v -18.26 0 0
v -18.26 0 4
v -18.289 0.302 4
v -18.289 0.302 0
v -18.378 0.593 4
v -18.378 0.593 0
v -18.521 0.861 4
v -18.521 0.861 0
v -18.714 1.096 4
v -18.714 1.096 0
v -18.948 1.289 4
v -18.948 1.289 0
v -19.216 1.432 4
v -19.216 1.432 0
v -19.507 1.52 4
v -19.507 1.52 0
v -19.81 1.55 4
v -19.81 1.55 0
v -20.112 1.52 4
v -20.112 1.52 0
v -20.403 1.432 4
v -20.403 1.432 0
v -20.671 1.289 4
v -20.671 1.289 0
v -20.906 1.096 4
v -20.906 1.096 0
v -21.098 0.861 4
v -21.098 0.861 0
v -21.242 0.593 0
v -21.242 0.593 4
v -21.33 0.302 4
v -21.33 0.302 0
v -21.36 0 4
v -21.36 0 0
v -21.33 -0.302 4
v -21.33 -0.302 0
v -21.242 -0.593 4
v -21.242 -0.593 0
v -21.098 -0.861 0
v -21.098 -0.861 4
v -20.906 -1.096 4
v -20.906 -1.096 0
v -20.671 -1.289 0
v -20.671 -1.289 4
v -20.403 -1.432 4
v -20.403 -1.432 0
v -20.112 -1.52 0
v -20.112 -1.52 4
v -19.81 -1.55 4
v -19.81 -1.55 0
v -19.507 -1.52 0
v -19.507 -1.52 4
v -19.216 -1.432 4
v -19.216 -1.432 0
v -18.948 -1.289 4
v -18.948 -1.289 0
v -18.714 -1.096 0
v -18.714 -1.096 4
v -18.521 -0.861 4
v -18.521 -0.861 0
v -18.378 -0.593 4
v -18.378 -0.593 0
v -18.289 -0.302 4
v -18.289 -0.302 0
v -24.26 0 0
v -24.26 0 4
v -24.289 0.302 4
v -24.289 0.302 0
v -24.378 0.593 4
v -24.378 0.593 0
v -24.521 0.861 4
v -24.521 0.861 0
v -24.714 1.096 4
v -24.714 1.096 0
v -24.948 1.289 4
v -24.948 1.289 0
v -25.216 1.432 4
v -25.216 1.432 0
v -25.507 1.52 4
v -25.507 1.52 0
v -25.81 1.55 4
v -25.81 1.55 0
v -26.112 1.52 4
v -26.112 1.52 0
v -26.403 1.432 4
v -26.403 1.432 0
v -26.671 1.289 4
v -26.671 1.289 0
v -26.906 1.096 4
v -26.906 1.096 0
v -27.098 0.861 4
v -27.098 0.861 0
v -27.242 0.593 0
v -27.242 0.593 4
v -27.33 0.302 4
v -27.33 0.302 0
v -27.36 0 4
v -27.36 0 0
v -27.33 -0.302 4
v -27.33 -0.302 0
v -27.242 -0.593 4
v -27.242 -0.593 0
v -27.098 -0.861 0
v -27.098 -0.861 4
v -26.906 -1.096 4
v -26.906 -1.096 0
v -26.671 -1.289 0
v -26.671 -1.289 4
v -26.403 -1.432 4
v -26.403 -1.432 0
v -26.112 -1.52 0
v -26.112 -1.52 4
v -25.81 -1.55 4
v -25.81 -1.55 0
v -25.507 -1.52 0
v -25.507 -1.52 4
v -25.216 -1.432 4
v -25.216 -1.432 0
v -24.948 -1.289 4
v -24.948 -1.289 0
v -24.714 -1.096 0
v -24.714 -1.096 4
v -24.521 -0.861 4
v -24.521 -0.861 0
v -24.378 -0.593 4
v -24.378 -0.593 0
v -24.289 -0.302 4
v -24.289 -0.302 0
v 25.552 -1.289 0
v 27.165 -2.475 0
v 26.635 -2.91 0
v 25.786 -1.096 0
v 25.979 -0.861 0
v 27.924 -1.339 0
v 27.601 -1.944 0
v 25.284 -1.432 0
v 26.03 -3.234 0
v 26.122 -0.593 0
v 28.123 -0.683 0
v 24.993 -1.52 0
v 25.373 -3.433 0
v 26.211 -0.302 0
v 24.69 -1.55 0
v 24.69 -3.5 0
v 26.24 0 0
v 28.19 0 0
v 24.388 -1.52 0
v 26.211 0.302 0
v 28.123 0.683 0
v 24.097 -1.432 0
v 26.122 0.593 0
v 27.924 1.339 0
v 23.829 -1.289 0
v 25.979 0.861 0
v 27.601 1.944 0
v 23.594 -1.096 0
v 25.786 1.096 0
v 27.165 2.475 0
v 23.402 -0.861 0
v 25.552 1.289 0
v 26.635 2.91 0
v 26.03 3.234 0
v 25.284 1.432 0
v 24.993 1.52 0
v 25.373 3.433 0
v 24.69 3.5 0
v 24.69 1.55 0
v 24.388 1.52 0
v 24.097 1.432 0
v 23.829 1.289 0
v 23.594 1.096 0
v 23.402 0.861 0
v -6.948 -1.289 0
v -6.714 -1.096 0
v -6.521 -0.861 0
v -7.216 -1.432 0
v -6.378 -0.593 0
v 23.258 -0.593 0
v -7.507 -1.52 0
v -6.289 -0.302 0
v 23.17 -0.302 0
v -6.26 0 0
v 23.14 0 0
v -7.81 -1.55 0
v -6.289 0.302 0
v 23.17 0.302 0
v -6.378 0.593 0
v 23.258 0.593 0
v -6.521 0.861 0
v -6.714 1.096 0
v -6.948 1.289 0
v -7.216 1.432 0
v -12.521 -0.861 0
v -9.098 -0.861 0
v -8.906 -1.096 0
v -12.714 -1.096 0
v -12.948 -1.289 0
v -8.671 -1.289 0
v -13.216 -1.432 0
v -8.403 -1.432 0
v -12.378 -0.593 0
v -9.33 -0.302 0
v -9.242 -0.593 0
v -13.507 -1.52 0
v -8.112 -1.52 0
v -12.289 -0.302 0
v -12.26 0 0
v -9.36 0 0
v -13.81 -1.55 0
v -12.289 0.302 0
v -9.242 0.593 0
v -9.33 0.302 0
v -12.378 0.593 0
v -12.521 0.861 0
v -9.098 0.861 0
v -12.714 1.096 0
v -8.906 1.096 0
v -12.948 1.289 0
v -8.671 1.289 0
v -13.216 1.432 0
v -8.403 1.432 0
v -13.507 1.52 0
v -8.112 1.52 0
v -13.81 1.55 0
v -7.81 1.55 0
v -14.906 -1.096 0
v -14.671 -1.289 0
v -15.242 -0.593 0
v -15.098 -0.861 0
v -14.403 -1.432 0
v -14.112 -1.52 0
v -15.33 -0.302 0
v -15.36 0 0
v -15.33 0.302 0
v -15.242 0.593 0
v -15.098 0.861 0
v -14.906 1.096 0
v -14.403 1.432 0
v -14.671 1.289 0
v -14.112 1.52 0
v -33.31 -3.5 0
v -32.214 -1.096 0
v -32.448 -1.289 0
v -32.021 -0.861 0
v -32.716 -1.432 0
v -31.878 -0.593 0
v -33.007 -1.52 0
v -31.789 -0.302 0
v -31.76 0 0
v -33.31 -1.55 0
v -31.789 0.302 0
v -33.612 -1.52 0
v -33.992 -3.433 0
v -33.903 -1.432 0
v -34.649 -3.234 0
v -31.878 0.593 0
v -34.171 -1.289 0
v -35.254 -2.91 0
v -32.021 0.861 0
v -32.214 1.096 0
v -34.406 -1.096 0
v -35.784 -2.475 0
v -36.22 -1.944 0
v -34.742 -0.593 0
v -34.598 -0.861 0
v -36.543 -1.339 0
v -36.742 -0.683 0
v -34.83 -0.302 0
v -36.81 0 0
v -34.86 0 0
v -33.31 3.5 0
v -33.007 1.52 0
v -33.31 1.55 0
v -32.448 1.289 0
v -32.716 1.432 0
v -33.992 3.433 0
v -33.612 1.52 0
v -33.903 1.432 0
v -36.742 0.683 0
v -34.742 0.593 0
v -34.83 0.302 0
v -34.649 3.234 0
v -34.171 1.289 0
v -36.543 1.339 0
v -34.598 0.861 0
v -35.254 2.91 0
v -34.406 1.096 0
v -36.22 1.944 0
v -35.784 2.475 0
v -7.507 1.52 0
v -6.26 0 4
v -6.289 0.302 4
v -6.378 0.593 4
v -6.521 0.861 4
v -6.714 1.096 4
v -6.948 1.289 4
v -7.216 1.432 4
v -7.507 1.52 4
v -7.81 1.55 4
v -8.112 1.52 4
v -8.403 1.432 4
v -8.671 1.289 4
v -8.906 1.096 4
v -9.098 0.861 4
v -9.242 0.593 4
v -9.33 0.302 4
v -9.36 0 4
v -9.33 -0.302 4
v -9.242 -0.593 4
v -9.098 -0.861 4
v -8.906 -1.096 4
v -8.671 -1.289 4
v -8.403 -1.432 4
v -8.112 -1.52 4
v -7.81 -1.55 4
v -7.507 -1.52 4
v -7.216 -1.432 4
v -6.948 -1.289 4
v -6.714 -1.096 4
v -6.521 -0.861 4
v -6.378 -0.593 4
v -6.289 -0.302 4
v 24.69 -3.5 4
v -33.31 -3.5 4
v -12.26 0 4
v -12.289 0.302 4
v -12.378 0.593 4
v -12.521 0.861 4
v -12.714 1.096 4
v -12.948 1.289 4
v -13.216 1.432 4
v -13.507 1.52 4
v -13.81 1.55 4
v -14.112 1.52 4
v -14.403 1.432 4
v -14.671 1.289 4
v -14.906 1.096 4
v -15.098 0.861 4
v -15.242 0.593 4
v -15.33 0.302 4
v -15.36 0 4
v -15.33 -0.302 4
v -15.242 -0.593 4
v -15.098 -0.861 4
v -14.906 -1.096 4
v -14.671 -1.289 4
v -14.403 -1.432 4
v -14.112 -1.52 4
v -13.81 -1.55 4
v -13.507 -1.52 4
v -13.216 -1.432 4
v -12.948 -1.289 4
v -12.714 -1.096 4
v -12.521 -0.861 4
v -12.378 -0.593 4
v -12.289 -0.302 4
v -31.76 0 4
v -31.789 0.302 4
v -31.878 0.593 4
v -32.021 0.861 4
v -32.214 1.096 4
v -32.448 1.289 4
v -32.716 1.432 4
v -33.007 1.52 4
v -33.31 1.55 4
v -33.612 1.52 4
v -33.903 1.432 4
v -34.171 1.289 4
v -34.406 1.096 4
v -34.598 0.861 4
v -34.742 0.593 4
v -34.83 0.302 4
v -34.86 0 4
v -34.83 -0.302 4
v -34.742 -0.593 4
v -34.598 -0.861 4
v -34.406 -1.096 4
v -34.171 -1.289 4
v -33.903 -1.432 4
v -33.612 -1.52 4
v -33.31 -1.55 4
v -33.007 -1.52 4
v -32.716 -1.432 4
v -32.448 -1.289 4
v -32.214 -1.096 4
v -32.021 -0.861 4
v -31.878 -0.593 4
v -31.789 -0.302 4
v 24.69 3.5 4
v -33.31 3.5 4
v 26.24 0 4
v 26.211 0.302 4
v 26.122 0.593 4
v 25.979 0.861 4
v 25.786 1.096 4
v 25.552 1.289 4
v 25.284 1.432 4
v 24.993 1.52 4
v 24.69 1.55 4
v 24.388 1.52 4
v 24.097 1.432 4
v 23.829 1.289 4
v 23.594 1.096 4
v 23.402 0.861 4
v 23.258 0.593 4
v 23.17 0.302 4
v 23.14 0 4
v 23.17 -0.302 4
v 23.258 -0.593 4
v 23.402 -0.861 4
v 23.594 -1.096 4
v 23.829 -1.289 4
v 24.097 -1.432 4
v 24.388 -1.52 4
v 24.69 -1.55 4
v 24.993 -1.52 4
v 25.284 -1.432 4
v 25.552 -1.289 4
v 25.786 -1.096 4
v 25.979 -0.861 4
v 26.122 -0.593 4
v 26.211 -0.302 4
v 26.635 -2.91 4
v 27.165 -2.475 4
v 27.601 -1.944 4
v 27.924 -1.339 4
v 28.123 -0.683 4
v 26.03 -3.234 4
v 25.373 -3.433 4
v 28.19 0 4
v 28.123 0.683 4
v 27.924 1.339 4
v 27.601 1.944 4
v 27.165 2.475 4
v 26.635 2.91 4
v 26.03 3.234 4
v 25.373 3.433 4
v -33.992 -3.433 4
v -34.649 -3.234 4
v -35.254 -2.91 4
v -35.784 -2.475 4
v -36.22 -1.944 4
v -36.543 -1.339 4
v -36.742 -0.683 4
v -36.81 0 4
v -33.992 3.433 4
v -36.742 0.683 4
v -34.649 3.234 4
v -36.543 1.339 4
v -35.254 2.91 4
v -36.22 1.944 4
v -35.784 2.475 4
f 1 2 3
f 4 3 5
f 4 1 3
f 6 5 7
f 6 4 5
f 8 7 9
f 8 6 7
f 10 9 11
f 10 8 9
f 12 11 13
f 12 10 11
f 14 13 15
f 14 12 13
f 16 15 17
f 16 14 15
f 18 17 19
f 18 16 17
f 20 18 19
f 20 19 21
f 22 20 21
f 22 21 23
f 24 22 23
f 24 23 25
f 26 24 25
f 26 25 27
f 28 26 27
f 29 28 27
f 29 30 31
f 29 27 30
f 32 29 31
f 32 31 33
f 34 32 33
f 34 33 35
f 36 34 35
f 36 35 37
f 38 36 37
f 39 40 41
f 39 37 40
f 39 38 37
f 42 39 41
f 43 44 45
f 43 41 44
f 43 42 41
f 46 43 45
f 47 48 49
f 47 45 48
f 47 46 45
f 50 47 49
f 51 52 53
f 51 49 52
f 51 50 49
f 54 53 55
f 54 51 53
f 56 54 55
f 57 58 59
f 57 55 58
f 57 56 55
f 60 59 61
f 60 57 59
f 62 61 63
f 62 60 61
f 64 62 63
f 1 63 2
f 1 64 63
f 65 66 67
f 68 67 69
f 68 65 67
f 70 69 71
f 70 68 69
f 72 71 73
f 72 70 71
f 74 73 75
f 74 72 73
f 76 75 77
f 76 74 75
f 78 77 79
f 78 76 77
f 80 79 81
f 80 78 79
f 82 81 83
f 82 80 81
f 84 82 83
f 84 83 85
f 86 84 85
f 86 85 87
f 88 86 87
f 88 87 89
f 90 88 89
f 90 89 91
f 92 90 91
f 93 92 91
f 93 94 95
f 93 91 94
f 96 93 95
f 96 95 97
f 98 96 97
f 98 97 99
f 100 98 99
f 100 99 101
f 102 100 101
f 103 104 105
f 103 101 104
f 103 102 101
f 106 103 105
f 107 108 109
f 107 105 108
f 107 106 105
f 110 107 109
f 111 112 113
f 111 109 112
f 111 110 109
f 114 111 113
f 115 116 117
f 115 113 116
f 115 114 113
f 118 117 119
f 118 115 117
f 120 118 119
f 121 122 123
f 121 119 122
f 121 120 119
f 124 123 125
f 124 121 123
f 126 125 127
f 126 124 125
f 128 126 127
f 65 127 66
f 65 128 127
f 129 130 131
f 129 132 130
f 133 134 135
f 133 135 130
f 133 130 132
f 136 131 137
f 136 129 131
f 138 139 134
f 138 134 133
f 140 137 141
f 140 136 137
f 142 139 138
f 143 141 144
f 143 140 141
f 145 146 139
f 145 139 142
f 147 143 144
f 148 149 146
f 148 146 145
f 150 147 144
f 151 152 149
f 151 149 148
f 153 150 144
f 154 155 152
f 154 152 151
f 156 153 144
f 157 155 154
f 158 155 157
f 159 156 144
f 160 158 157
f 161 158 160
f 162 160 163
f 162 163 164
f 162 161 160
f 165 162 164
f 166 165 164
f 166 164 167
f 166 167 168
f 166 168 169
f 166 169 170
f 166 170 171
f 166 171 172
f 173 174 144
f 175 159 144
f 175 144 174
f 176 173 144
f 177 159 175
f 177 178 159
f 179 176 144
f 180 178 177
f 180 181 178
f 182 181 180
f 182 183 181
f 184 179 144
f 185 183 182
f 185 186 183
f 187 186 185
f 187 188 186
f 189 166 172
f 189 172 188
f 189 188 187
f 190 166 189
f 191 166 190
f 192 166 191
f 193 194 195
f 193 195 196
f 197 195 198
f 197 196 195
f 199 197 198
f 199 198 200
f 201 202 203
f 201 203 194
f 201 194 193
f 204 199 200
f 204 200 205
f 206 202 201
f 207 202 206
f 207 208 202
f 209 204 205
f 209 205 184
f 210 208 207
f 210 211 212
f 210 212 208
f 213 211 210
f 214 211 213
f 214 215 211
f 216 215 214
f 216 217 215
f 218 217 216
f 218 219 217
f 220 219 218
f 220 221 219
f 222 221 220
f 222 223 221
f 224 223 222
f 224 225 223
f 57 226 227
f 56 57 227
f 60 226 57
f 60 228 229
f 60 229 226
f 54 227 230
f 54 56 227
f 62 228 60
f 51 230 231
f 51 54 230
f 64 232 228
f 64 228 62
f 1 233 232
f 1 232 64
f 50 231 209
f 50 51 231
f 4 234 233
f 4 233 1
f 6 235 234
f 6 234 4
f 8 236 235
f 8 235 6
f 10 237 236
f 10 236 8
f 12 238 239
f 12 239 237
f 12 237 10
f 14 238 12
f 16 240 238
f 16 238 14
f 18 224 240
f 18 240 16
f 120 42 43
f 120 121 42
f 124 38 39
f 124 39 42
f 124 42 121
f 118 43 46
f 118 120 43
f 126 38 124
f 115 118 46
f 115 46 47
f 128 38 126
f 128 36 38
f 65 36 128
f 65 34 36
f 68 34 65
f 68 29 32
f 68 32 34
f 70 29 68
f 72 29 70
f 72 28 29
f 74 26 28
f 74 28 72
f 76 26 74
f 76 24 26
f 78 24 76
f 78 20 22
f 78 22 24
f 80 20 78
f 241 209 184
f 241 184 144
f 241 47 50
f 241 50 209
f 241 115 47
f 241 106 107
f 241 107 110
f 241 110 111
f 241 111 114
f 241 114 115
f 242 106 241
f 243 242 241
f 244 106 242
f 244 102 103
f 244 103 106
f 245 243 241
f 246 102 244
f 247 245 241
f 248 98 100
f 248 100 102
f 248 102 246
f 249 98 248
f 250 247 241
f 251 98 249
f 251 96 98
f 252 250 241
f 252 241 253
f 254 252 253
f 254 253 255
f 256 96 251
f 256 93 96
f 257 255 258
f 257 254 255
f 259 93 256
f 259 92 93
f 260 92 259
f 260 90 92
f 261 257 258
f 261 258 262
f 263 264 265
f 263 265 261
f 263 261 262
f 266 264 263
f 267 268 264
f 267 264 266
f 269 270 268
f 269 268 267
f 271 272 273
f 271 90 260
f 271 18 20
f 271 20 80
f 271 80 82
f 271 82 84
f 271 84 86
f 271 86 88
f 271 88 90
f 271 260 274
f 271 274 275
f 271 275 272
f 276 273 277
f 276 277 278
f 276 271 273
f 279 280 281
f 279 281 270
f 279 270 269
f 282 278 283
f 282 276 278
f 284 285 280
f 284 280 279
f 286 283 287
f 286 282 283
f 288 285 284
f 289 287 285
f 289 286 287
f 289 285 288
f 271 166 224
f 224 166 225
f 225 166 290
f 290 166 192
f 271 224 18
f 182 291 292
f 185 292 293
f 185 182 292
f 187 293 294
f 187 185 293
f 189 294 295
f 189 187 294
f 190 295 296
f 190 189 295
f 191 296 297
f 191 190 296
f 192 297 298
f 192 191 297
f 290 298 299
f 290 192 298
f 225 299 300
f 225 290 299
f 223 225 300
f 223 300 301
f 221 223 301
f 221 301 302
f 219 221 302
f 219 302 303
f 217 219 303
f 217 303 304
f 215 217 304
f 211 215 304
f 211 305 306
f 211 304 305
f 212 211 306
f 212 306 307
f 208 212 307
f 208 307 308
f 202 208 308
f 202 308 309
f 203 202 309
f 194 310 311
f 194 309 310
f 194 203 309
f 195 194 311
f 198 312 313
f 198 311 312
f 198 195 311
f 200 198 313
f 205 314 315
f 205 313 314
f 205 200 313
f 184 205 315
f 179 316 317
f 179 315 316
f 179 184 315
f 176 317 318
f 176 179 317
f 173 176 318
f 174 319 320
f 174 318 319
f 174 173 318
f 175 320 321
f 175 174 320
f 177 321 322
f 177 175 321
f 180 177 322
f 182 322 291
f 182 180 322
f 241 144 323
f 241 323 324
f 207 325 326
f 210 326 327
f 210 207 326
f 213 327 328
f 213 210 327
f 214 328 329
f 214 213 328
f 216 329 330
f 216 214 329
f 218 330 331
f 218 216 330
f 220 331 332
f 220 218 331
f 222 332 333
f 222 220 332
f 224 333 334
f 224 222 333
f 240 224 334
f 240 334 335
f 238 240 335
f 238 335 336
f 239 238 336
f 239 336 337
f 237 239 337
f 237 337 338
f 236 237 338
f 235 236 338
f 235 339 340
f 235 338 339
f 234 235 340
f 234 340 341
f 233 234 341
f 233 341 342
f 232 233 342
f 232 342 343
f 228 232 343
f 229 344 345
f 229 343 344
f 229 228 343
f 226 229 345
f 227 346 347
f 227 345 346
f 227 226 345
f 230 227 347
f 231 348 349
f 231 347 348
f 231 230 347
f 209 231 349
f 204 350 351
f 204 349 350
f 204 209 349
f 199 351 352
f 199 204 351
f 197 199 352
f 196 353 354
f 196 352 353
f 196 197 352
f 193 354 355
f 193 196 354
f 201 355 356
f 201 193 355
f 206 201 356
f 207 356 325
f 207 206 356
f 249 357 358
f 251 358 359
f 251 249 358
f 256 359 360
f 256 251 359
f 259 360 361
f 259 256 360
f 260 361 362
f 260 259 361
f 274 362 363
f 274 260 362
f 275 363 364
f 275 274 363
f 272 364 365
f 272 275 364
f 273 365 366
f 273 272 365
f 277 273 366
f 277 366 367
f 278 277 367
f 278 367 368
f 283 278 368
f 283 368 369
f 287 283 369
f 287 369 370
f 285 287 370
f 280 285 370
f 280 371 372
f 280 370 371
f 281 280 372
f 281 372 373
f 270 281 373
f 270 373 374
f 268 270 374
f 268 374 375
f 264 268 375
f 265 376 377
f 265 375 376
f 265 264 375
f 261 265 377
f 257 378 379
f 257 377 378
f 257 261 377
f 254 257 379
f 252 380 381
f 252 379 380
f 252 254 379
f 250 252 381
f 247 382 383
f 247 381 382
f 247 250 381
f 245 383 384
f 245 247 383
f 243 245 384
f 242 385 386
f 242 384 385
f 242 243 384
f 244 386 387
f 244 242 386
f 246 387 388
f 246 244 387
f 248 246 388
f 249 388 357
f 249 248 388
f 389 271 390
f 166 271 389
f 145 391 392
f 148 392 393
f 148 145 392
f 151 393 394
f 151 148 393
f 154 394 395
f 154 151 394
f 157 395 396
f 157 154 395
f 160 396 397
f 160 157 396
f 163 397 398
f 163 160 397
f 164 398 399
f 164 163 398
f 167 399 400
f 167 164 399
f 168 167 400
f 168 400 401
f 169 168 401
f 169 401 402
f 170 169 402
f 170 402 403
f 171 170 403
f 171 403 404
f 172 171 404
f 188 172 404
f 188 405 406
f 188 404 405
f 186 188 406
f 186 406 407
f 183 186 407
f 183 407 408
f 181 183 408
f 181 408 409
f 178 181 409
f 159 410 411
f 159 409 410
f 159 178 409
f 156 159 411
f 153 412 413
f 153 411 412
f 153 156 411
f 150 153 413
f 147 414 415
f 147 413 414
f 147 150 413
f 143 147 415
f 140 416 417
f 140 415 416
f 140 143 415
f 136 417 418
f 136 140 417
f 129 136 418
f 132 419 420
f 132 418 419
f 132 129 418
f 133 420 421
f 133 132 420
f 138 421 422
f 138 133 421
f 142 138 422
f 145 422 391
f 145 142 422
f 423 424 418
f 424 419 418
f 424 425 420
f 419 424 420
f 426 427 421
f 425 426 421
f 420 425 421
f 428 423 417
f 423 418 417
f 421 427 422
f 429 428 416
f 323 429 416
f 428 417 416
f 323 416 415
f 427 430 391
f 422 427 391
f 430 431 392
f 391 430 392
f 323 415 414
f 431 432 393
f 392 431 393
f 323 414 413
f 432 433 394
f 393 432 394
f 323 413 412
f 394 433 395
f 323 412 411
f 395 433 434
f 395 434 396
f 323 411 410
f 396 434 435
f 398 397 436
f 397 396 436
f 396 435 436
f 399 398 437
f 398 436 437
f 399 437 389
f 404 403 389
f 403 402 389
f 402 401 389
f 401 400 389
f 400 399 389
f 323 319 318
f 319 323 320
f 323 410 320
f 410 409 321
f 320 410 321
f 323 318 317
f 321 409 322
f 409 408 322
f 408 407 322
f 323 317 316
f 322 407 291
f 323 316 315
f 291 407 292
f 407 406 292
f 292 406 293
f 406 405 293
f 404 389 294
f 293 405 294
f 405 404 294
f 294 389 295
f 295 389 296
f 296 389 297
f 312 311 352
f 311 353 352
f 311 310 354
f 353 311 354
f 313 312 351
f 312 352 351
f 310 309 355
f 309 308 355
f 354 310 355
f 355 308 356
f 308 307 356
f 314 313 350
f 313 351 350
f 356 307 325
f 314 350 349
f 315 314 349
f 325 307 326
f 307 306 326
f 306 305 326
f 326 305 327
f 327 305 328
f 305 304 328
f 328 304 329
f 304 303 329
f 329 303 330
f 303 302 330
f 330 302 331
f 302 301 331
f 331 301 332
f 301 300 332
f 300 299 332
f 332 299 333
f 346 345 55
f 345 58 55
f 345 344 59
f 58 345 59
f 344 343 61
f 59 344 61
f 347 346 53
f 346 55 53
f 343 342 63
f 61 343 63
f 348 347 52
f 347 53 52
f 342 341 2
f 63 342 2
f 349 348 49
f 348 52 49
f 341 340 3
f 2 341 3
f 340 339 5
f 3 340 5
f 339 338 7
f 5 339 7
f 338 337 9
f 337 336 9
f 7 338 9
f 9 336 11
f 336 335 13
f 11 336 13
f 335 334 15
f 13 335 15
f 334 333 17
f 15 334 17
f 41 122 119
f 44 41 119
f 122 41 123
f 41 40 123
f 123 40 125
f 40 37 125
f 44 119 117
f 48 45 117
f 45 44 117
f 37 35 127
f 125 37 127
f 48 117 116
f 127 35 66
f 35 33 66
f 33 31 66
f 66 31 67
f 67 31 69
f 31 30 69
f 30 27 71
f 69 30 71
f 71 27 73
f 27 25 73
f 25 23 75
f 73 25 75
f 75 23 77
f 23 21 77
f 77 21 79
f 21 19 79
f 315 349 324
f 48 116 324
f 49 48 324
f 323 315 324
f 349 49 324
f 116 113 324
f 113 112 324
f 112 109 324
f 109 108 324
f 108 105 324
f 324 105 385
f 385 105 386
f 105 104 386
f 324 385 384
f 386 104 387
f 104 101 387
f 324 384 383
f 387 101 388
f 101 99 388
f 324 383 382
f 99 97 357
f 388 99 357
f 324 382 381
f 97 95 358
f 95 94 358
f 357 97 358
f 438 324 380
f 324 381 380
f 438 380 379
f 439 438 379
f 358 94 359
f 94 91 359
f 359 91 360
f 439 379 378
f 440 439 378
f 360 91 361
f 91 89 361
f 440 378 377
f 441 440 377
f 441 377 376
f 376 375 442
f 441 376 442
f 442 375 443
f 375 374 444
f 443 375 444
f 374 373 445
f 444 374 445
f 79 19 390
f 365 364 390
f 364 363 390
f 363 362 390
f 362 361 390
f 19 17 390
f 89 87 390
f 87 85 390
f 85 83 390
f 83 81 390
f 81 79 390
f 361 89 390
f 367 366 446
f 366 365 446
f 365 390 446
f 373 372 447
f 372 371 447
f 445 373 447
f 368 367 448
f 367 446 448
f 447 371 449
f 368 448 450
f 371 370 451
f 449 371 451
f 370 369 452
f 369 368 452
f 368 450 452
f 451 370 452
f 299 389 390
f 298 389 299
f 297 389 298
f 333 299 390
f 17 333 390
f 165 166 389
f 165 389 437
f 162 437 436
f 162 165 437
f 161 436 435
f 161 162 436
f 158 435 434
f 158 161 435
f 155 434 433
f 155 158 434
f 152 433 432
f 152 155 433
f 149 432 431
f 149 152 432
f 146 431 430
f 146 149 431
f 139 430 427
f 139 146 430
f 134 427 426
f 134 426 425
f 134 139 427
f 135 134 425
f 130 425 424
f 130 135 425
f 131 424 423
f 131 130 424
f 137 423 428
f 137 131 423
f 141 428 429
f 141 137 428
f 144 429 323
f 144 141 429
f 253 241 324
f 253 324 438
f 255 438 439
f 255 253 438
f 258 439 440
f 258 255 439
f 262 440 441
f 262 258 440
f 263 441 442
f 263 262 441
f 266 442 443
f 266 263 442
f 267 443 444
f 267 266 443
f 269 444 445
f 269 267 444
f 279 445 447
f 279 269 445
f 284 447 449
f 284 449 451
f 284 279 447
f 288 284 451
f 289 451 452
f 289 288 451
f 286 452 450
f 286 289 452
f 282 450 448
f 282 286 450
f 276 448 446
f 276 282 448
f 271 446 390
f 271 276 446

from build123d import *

# Parameters (mm, degrees)
BOSS_EXTRUDE1_DEPTH = 4
SKETCH2_R           = 1.55
CUT_EXTRUDE6_DEPTH  = 38.1913603


with BuildPart() as part:
    # Sketch1 → Boss-Extrude1 (new body)
    with BuildSketch(Plane.XY):
        with BuildLine():
            Line((-33.309608541, 3.5), (24.690391459, 3.5))
            ThreePointArc((24.690391459, 3.5), (28.190391459, 0), (24.690391459, -3.5))
            Line((24.690391459, -3.5), (-33.309608541, -3.5))
            ThreePointArc((-33.309608541, -3.5), (-36.809608541, 0), (-33.309608541, 3.5))
        make_face()
    extrude(amount=BOSS_EXTRUDE1_DEPTH)

    # Sketch2 → Cut-Extrude6 (cut, through all)
    with BuildSketch(Plane.XY):
        with Locations((-33.309608541, 0)):
            Circle(SKETCH2_R)
        with Locations((-19.809608541, 0)):
            Circle(SKETCH2_R)
        with Locations((24.690391459, 0)):
            Circle(SKETCH2_R)
        with Locations((-25.809608541, 0)):
            Circle(SKETCH2_R)
        with Locations((-13.809608541, 0)):
            Circle(SKETCH2_R)
        with Locations((-7.809608541, 0)):
            Circle(SKETCH2_R)
    extrude(amount=CUT_EXTRUDE6_DEPTH, mode=Mode.SUBTRACT)


solid = part.part
